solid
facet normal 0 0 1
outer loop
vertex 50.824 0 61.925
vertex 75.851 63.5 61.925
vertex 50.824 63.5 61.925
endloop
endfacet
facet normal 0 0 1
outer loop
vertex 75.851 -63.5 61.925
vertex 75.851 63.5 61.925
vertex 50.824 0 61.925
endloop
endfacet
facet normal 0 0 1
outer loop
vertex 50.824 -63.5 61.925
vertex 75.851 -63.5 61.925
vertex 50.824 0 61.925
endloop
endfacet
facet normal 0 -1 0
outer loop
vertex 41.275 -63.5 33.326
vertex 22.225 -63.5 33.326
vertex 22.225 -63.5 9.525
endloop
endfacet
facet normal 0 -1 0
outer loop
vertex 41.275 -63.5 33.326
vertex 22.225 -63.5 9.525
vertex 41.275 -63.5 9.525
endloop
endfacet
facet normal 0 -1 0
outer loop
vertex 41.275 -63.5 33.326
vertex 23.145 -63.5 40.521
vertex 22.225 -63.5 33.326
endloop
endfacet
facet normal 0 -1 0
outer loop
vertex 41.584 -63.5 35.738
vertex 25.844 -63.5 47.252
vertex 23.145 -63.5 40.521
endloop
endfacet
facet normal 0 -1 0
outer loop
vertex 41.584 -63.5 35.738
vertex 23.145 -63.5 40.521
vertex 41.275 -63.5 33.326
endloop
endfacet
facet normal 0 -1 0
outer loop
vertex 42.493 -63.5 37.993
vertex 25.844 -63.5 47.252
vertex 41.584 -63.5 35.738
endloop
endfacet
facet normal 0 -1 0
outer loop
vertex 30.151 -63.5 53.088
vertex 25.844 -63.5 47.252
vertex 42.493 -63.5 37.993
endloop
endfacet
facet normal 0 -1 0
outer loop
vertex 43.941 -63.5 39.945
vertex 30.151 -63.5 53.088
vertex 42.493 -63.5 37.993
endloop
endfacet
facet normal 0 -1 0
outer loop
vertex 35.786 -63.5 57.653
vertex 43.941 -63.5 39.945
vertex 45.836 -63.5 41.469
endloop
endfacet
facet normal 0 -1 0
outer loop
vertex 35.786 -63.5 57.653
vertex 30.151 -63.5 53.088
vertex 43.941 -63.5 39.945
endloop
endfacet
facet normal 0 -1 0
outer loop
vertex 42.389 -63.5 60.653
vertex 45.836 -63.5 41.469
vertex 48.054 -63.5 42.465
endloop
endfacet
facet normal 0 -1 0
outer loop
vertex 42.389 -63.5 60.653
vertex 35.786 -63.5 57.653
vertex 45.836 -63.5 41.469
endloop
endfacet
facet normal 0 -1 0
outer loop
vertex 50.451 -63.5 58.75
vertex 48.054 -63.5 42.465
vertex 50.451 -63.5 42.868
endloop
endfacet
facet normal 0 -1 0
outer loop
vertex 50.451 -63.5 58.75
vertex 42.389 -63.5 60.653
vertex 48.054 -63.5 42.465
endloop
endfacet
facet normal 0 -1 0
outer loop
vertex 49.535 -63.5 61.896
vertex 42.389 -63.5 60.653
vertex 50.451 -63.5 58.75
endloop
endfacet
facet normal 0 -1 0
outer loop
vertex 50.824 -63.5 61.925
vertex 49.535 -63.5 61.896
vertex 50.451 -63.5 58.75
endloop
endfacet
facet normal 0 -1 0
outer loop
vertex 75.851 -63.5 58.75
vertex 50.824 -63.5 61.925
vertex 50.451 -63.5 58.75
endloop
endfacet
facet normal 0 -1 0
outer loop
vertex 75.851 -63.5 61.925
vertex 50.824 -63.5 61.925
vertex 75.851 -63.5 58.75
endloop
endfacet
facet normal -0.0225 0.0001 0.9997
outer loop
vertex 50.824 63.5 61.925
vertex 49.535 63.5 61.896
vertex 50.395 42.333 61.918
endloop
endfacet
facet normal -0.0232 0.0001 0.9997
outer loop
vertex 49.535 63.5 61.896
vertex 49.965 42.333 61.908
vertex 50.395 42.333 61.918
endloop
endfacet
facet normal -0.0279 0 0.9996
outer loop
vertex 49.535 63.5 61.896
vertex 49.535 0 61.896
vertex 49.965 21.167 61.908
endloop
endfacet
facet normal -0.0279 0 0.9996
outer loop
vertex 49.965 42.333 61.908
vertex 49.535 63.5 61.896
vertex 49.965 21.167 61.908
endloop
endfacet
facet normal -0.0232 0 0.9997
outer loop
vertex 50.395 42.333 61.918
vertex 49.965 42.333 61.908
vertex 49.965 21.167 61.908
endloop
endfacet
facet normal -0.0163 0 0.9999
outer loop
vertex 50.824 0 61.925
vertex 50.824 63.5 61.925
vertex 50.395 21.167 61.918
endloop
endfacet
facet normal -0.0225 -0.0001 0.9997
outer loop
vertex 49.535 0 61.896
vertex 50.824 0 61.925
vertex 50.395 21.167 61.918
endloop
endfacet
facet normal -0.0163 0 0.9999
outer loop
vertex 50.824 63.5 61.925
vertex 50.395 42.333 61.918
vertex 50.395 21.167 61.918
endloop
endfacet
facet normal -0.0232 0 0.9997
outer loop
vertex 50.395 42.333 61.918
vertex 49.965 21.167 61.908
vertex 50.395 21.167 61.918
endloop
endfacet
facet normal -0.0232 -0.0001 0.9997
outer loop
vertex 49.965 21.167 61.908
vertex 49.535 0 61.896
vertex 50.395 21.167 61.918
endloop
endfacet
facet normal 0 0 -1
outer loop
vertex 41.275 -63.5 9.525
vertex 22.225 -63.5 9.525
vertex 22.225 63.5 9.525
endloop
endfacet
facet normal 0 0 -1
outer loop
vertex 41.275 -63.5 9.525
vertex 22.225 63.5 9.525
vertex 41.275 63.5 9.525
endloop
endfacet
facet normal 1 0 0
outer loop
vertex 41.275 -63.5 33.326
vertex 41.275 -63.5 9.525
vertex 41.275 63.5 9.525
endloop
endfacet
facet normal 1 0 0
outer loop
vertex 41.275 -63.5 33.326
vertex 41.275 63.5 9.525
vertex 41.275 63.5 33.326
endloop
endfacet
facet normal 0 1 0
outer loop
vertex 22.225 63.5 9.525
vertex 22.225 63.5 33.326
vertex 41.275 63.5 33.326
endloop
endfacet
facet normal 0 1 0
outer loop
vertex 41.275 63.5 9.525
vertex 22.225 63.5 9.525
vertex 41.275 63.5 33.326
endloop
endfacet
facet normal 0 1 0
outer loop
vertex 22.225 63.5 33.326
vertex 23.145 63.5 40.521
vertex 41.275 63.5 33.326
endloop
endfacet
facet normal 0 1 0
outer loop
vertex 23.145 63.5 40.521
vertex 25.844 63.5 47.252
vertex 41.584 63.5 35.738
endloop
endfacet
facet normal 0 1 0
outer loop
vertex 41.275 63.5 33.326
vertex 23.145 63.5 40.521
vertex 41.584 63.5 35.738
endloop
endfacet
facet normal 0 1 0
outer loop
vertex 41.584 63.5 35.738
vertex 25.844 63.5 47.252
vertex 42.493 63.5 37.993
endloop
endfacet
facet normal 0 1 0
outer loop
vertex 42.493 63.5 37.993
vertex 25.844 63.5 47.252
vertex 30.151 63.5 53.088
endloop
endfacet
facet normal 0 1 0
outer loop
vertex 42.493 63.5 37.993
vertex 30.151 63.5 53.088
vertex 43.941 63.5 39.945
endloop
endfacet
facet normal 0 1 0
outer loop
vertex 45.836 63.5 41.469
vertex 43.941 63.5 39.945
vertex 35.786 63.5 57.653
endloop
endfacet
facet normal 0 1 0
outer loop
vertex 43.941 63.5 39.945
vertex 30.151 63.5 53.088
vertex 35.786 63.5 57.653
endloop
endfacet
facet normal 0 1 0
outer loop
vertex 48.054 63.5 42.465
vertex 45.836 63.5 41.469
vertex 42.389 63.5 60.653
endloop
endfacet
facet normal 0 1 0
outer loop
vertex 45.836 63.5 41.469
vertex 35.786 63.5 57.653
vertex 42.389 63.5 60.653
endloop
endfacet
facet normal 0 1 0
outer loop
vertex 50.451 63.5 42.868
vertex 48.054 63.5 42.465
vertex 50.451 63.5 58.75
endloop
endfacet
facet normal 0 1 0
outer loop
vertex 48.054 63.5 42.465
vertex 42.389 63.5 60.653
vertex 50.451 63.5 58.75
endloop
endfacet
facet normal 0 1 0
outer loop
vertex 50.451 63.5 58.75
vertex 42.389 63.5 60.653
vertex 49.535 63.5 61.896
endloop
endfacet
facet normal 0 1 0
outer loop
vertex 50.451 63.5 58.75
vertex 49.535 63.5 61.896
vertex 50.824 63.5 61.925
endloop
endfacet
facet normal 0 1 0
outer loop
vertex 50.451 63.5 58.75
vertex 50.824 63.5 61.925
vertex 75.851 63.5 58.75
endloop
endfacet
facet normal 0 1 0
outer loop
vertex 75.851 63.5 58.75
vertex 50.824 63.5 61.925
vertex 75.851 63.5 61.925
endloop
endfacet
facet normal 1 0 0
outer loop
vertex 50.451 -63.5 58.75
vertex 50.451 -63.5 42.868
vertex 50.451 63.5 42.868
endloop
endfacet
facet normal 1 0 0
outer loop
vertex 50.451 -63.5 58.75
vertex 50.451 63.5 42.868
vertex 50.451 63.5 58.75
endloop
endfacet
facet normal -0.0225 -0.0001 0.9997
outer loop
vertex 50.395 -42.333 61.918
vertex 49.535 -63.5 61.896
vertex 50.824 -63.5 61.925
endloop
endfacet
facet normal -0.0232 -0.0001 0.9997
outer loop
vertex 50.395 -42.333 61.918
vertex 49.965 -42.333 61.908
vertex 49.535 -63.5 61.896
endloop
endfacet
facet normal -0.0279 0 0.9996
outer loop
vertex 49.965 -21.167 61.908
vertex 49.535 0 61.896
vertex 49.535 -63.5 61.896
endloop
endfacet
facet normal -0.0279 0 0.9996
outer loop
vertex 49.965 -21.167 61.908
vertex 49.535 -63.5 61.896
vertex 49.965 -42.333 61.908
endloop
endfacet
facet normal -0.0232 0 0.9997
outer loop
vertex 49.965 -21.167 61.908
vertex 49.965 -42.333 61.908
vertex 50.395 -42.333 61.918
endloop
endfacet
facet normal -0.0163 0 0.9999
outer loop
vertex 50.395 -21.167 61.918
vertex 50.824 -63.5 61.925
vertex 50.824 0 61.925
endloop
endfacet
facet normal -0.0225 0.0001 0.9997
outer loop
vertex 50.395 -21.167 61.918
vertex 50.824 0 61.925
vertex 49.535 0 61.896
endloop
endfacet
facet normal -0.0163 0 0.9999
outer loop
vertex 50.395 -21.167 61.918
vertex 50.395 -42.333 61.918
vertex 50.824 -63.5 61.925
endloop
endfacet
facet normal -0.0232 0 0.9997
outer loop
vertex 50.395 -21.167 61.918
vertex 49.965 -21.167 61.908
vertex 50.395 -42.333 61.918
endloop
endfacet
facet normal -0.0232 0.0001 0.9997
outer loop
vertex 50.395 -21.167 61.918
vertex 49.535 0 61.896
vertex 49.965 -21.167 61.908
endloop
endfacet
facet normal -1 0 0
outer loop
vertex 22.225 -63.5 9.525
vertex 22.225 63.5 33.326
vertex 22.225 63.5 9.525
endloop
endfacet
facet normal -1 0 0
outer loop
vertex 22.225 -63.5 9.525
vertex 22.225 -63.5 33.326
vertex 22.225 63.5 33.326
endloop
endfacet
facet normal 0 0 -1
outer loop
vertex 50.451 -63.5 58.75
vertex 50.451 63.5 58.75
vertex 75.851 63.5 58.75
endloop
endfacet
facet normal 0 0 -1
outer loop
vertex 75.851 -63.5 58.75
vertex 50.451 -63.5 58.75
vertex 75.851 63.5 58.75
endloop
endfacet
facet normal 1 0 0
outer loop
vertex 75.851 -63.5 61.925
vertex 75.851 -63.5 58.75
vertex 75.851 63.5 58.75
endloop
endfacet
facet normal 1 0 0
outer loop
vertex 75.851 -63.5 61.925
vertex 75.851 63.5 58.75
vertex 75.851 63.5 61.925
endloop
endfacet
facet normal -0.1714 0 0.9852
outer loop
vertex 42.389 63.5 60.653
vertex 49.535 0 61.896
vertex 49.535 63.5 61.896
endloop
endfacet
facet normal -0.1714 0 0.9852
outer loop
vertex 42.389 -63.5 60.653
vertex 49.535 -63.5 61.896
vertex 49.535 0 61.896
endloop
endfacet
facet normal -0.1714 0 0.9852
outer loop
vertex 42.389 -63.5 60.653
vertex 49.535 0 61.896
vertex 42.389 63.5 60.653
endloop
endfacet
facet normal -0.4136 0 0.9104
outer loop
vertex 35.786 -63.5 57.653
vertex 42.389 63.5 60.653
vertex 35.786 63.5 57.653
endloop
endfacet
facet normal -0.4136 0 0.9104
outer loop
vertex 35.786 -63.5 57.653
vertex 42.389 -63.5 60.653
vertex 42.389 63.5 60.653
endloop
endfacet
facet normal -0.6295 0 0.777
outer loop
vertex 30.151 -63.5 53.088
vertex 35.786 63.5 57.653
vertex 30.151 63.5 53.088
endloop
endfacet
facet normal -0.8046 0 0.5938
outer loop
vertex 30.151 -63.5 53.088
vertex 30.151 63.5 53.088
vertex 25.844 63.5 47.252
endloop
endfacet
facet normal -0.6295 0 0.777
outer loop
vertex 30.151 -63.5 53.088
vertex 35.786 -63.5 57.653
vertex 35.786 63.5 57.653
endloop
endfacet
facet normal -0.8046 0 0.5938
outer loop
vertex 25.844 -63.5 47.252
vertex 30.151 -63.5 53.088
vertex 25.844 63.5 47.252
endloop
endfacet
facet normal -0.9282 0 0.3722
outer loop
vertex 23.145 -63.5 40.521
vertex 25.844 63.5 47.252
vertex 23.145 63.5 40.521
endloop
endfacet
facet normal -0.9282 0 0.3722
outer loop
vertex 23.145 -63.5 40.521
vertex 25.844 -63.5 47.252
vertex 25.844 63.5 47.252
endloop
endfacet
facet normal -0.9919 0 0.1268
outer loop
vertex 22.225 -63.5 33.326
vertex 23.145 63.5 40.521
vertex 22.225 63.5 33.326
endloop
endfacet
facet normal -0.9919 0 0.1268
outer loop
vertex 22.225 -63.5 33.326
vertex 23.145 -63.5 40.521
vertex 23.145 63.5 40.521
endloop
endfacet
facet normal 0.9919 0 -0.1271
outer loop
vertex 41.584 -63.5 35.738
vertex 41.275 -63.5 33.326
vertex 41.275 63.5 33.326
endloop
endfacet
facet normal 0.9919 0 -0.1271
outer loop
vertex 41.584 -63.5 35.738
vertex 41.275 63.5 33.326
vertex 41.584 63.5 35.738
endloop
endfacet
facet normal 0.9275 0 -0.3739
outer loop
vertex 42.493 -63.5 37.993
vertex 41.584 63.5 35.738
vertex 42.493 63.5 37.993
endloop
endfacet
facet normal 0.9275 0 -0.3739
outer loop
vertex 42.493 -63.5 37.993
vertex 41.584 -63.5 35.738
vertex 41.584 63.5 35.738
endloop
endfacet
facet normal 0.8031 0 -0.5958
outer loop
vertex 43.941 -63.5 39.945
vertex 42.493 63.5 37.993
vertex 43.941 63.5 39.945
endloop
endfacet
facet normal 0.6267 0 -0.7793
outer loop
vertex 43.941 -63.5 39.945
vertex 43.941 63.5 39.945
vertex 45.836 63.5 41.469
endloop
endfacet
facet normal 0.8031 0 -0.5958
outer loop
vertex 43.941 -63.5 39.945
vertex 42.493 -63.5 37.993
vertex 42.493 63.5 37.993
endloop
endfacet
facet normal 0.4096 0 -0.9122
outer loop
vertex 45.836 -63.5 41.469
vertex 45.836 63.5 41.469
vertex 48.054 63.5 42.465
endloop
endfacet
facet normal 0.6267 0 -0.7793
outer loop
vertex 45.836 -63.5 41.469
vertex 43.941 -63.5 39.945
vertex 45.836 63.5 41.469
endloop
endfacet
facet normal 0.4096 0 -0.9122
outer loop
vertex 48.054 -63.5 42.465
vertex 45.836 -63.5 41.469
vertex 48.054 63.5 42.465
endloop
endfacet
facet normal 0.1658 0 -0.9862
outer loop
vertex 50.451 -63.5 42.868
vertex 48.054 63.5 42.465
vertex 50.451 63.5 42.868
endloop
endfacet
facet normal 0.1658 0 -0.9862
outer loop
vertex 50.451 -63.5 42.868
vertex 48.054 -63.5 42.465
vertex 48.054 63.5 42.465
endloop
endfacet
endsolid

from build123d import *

# Parameters (mm, degrees)
F1_DEPTH = 63.5


with BuildPart() as f1:
    # F0 (on Front) → F1 (new body, symmetric)
    with BuildSketch(Plane.XZ):
        with BuildLine():
            Line((22.225, 33.32649), (22.225, 9.525))
            Line((22.225, 9.525), (41.275, 9.525))
            Line((41.275, 9.525), (41.275, 33.32649))
            ThreePointArc((41.275, 33.32649), (43.941213, 39.945334), (50.450921, 42.86792))
            Line((50.450921, 42.86792), (50.450921, 58.7502))
            Line((50.450921, 58.7502), (75.850921, 58.7502))
            Line((75.850921, 58.7502), (75.850921, 61.9252))
            Line((75.850921, 61.9252), (50.82371, 61.9252))
            add(Edge.make_bspline(
                [(49.53475, 61.896138), (49.965303, 61.908992), (50.394979, 61.918694), (50.82371, 61.9252)],
                knots=[104.865796, 104.865796, 104.865796, 104.865796, 105.962038, 105.962038, 105.962038, 105.962038], degree=3))
            ThreePointArc((49.53475, 61.896138), (30.150674, 53.087861), (22.225, 33.32649))
        make_face()
    extrude(amount=F1_DEPTH, both=True)


solid = f1.part
